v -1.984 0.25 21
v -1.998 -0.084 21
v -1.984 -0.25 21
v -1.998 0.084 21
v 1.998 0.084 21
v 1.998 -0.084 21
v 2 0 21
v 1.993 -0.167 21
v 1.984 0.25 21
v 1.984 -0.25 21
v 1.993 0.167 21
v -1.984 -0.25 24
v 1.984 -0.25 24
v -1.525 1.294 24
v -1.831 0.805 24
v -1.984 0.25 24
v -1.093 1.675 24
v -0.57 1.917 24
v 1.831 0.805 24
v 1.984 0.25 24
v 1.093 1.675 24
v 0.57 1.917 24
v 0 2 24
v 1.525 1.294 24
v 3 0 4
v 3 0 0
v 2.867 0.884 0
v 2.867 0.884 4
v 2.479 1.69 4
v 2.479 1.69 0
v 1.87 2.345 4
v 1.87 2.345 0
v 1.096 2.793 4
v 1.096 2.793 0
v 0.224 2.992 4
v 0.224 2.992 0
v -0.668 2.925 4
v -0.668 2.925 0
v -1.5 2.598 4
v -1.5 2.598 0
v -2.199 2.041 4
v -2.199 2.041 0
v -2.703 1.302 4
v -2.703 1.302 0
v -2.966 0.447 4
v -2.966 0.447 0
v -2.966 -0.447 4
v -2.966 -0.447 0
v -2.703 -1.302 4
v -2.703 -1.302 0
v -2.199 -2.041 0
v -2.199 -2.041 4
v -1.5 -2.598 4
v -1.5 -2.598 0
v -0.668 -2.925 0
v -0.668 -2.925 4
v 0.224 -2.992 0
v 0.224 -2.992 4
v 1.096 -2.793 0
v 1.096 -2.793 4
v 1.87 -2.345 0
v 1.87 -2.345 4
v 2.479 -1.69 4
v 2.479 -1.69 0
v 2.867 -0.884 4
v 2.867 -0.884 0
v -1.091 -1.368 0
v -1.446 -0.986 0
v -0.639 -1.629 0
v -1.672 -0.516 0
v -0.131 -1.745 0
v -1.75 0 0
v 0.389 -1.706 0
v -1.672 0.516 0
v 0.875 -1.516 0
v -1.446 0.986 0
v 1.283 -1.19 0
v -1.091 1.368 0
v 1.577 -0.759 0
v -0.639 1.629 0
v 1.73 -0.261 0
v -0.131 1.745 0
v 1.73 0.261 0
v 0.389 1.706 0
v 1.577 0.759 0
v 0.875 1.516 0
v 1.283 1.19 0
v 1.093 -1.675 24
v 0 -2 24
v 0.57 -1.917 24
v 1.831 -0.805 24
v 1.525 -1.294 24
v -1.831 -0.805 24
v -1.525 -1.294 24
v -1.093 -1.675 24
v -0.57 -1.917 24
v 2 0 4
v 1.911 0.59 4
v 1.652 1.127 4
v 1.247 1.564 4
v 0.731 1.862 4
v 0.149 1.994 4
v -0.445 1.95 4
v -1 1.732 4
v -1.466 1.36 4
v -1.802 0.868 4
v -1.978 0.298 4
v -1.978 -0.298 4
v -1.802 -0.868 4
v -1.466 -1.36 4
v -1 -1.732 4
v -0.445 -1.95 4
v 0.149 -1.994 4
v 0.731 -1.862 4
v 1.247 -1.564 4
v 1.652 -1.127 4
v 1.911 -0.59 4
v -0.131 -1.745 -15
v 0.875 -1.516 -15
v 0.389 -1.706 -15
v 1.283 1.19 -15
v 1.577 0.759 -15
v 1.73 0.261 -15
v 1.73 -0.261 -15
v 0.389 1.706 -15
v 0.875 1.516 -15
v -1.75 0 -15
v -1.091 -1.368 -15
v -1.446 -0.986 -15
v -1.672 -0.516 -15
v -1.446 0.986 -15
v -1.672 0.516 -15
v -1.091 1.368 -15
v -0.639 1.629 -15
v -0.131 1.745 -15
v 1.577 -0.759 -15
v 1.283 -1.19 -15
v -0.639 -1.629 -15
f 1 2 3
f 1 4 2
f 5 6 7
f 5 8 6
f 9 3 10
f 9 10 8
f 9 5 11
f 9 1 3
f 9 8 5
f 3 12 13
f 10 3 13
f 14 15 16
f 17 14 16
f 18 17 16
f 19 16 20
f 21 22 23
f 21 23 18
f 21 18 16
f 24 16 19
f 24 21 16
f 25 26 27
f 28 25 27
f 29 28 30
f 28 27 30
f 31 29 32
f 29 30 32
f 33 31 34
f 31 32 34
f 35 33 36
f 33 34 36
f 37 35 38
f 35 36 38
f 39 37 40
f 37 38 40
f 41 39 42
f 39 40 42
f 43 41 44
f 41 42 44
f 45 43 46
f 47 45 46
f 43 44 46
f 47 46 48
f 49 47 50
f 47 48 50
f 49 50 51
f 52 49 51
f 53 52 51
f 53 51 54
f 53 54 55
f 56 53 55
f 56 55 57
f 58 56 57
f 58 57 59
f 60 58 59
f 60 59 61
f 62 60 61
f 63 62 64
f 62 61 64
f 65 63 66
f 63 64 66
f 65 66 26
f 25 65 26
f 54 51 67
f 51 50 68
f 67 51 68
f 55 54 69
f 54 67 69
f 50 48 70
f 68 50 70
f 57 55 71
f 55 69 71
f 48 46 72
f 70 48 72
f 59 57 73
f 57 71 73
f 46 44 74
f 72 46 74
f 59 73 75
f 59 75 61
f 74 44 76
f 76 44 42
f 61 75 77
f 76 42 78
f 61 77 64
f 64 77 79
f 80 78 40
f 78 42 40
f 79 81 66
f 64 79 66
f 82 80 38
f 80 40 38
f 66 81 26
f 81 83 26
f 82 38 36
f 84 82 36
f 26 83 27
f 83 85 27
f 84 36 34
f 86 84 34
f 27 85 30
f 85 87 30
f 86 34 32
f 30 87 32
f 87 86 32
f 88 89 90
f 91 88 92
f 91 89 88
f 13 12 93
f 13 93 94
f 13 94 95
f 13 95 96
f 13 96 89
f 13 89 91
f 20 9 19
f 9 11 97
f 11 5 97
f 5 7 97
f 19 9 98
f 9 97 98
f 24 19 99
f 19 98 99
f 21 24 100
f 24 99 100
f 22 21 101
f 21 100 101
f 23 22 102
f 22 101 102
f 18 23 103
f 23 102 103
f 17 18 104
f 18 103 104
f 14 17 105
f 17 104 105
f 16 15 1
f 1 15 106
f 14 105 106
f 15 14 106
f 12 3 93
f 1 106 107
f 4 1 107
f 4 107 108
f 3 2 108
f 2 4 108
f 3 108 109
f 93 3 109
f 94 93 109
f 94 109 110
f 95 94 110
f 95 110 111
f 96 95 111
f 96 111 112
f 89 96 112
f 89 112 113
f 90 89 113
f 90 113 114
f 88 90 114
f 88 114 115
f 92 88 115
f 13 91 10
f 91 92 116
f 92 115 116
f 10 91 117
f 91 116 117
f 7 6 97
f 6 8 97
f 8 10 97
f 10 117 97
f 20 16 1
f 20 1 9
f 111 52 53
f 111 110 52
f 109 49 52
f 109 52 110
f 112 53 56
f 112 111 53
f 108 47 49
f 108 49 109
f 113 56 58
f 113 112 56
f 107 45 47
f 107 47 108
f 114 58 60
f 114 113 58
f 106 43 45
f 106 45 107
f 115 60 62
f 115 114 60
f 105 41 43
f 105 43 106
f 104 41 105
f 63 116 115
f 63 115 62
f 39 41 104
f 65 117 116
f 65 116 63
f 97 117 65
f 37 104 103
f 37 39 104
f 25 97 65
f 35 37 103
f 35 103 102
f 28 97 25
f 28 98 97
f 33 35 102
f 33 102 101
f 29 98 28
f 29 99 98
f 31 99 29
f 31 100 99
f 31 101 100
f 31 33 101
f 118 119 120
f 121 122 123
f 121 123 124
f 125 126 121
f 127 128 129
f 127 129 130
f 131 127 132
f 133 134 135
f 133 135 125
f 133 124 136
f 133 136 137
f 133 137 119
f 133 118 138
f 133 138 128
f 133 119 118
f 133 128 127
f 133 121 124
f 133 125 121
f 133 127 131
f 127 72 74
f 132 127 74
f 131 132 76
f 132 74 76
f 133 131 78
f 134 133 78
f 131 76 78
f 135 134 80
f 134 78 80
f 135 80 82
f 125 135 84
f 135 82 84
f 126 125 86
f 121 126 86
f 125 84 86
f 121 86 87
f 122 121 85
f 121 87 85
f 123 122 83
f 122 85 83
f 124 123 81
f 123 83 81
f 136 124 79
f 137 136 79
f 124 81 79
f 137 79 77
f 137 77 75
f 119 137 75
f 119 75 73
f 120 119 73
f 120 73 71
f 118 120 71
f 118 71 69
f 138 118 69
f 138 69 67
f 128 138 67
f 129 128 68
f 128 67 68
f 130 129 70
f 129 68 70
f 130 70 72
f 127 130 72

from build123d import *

# Parameters (mm, degrees)
SKETCH_1_R          = 3
EXTRUDE_1_DEPTH     = 4
SKETCH_2_R          = 2
EXTRUDE_2_DEPTH     = 20
SKETCH_3_R          = 1.75
EXTRUDE_3_DEPTH     = 15
SKETCH_4_W          = 4.461198183
SKETCH_4_H          = 0.5
CUT_EXTRUDE_1_DEPTH = 3


with BuildPart() as part:
    # 스케치1 → 보스-돌출1 (new body)
    with BuildSketch(Plane.XY):
        Circle(SKETCH_1_R)
    extrude(amount=EXTRUDE_1_DEPTH)

    # 스케치2 → 보스-돌출2 (add)
    with BuildSketch(Plane.XY.offset(4)):
        Circle(SKETCH_2_R)
    extrude(amount=EXTRUDE_2_DEPTH)

    # 스케치3 → 보스-돌출3 (add)
    with BuildSketch(Plane(origin=(0, 0, 0), x_dir=(-1, 0, 0), z_dir=(0, 0, -1))):
        Circle(SKETCH_3_R)
    extrude(amount=EXTRUDE_3_DEPTH)

    # 스케치4 → 컷-돌출1 (cut)
    with BuildSketch(Plane.XY.offset(24)):
        with Locations((-0.011637909, 0)):
            Rectangle(SKETCH_4_W, SKETCH_4_H)
    extrude(amount=-CUT_EXTRUDE_1_DEPTH, mode=Mode.SUBTRACT)


solid = part.part
